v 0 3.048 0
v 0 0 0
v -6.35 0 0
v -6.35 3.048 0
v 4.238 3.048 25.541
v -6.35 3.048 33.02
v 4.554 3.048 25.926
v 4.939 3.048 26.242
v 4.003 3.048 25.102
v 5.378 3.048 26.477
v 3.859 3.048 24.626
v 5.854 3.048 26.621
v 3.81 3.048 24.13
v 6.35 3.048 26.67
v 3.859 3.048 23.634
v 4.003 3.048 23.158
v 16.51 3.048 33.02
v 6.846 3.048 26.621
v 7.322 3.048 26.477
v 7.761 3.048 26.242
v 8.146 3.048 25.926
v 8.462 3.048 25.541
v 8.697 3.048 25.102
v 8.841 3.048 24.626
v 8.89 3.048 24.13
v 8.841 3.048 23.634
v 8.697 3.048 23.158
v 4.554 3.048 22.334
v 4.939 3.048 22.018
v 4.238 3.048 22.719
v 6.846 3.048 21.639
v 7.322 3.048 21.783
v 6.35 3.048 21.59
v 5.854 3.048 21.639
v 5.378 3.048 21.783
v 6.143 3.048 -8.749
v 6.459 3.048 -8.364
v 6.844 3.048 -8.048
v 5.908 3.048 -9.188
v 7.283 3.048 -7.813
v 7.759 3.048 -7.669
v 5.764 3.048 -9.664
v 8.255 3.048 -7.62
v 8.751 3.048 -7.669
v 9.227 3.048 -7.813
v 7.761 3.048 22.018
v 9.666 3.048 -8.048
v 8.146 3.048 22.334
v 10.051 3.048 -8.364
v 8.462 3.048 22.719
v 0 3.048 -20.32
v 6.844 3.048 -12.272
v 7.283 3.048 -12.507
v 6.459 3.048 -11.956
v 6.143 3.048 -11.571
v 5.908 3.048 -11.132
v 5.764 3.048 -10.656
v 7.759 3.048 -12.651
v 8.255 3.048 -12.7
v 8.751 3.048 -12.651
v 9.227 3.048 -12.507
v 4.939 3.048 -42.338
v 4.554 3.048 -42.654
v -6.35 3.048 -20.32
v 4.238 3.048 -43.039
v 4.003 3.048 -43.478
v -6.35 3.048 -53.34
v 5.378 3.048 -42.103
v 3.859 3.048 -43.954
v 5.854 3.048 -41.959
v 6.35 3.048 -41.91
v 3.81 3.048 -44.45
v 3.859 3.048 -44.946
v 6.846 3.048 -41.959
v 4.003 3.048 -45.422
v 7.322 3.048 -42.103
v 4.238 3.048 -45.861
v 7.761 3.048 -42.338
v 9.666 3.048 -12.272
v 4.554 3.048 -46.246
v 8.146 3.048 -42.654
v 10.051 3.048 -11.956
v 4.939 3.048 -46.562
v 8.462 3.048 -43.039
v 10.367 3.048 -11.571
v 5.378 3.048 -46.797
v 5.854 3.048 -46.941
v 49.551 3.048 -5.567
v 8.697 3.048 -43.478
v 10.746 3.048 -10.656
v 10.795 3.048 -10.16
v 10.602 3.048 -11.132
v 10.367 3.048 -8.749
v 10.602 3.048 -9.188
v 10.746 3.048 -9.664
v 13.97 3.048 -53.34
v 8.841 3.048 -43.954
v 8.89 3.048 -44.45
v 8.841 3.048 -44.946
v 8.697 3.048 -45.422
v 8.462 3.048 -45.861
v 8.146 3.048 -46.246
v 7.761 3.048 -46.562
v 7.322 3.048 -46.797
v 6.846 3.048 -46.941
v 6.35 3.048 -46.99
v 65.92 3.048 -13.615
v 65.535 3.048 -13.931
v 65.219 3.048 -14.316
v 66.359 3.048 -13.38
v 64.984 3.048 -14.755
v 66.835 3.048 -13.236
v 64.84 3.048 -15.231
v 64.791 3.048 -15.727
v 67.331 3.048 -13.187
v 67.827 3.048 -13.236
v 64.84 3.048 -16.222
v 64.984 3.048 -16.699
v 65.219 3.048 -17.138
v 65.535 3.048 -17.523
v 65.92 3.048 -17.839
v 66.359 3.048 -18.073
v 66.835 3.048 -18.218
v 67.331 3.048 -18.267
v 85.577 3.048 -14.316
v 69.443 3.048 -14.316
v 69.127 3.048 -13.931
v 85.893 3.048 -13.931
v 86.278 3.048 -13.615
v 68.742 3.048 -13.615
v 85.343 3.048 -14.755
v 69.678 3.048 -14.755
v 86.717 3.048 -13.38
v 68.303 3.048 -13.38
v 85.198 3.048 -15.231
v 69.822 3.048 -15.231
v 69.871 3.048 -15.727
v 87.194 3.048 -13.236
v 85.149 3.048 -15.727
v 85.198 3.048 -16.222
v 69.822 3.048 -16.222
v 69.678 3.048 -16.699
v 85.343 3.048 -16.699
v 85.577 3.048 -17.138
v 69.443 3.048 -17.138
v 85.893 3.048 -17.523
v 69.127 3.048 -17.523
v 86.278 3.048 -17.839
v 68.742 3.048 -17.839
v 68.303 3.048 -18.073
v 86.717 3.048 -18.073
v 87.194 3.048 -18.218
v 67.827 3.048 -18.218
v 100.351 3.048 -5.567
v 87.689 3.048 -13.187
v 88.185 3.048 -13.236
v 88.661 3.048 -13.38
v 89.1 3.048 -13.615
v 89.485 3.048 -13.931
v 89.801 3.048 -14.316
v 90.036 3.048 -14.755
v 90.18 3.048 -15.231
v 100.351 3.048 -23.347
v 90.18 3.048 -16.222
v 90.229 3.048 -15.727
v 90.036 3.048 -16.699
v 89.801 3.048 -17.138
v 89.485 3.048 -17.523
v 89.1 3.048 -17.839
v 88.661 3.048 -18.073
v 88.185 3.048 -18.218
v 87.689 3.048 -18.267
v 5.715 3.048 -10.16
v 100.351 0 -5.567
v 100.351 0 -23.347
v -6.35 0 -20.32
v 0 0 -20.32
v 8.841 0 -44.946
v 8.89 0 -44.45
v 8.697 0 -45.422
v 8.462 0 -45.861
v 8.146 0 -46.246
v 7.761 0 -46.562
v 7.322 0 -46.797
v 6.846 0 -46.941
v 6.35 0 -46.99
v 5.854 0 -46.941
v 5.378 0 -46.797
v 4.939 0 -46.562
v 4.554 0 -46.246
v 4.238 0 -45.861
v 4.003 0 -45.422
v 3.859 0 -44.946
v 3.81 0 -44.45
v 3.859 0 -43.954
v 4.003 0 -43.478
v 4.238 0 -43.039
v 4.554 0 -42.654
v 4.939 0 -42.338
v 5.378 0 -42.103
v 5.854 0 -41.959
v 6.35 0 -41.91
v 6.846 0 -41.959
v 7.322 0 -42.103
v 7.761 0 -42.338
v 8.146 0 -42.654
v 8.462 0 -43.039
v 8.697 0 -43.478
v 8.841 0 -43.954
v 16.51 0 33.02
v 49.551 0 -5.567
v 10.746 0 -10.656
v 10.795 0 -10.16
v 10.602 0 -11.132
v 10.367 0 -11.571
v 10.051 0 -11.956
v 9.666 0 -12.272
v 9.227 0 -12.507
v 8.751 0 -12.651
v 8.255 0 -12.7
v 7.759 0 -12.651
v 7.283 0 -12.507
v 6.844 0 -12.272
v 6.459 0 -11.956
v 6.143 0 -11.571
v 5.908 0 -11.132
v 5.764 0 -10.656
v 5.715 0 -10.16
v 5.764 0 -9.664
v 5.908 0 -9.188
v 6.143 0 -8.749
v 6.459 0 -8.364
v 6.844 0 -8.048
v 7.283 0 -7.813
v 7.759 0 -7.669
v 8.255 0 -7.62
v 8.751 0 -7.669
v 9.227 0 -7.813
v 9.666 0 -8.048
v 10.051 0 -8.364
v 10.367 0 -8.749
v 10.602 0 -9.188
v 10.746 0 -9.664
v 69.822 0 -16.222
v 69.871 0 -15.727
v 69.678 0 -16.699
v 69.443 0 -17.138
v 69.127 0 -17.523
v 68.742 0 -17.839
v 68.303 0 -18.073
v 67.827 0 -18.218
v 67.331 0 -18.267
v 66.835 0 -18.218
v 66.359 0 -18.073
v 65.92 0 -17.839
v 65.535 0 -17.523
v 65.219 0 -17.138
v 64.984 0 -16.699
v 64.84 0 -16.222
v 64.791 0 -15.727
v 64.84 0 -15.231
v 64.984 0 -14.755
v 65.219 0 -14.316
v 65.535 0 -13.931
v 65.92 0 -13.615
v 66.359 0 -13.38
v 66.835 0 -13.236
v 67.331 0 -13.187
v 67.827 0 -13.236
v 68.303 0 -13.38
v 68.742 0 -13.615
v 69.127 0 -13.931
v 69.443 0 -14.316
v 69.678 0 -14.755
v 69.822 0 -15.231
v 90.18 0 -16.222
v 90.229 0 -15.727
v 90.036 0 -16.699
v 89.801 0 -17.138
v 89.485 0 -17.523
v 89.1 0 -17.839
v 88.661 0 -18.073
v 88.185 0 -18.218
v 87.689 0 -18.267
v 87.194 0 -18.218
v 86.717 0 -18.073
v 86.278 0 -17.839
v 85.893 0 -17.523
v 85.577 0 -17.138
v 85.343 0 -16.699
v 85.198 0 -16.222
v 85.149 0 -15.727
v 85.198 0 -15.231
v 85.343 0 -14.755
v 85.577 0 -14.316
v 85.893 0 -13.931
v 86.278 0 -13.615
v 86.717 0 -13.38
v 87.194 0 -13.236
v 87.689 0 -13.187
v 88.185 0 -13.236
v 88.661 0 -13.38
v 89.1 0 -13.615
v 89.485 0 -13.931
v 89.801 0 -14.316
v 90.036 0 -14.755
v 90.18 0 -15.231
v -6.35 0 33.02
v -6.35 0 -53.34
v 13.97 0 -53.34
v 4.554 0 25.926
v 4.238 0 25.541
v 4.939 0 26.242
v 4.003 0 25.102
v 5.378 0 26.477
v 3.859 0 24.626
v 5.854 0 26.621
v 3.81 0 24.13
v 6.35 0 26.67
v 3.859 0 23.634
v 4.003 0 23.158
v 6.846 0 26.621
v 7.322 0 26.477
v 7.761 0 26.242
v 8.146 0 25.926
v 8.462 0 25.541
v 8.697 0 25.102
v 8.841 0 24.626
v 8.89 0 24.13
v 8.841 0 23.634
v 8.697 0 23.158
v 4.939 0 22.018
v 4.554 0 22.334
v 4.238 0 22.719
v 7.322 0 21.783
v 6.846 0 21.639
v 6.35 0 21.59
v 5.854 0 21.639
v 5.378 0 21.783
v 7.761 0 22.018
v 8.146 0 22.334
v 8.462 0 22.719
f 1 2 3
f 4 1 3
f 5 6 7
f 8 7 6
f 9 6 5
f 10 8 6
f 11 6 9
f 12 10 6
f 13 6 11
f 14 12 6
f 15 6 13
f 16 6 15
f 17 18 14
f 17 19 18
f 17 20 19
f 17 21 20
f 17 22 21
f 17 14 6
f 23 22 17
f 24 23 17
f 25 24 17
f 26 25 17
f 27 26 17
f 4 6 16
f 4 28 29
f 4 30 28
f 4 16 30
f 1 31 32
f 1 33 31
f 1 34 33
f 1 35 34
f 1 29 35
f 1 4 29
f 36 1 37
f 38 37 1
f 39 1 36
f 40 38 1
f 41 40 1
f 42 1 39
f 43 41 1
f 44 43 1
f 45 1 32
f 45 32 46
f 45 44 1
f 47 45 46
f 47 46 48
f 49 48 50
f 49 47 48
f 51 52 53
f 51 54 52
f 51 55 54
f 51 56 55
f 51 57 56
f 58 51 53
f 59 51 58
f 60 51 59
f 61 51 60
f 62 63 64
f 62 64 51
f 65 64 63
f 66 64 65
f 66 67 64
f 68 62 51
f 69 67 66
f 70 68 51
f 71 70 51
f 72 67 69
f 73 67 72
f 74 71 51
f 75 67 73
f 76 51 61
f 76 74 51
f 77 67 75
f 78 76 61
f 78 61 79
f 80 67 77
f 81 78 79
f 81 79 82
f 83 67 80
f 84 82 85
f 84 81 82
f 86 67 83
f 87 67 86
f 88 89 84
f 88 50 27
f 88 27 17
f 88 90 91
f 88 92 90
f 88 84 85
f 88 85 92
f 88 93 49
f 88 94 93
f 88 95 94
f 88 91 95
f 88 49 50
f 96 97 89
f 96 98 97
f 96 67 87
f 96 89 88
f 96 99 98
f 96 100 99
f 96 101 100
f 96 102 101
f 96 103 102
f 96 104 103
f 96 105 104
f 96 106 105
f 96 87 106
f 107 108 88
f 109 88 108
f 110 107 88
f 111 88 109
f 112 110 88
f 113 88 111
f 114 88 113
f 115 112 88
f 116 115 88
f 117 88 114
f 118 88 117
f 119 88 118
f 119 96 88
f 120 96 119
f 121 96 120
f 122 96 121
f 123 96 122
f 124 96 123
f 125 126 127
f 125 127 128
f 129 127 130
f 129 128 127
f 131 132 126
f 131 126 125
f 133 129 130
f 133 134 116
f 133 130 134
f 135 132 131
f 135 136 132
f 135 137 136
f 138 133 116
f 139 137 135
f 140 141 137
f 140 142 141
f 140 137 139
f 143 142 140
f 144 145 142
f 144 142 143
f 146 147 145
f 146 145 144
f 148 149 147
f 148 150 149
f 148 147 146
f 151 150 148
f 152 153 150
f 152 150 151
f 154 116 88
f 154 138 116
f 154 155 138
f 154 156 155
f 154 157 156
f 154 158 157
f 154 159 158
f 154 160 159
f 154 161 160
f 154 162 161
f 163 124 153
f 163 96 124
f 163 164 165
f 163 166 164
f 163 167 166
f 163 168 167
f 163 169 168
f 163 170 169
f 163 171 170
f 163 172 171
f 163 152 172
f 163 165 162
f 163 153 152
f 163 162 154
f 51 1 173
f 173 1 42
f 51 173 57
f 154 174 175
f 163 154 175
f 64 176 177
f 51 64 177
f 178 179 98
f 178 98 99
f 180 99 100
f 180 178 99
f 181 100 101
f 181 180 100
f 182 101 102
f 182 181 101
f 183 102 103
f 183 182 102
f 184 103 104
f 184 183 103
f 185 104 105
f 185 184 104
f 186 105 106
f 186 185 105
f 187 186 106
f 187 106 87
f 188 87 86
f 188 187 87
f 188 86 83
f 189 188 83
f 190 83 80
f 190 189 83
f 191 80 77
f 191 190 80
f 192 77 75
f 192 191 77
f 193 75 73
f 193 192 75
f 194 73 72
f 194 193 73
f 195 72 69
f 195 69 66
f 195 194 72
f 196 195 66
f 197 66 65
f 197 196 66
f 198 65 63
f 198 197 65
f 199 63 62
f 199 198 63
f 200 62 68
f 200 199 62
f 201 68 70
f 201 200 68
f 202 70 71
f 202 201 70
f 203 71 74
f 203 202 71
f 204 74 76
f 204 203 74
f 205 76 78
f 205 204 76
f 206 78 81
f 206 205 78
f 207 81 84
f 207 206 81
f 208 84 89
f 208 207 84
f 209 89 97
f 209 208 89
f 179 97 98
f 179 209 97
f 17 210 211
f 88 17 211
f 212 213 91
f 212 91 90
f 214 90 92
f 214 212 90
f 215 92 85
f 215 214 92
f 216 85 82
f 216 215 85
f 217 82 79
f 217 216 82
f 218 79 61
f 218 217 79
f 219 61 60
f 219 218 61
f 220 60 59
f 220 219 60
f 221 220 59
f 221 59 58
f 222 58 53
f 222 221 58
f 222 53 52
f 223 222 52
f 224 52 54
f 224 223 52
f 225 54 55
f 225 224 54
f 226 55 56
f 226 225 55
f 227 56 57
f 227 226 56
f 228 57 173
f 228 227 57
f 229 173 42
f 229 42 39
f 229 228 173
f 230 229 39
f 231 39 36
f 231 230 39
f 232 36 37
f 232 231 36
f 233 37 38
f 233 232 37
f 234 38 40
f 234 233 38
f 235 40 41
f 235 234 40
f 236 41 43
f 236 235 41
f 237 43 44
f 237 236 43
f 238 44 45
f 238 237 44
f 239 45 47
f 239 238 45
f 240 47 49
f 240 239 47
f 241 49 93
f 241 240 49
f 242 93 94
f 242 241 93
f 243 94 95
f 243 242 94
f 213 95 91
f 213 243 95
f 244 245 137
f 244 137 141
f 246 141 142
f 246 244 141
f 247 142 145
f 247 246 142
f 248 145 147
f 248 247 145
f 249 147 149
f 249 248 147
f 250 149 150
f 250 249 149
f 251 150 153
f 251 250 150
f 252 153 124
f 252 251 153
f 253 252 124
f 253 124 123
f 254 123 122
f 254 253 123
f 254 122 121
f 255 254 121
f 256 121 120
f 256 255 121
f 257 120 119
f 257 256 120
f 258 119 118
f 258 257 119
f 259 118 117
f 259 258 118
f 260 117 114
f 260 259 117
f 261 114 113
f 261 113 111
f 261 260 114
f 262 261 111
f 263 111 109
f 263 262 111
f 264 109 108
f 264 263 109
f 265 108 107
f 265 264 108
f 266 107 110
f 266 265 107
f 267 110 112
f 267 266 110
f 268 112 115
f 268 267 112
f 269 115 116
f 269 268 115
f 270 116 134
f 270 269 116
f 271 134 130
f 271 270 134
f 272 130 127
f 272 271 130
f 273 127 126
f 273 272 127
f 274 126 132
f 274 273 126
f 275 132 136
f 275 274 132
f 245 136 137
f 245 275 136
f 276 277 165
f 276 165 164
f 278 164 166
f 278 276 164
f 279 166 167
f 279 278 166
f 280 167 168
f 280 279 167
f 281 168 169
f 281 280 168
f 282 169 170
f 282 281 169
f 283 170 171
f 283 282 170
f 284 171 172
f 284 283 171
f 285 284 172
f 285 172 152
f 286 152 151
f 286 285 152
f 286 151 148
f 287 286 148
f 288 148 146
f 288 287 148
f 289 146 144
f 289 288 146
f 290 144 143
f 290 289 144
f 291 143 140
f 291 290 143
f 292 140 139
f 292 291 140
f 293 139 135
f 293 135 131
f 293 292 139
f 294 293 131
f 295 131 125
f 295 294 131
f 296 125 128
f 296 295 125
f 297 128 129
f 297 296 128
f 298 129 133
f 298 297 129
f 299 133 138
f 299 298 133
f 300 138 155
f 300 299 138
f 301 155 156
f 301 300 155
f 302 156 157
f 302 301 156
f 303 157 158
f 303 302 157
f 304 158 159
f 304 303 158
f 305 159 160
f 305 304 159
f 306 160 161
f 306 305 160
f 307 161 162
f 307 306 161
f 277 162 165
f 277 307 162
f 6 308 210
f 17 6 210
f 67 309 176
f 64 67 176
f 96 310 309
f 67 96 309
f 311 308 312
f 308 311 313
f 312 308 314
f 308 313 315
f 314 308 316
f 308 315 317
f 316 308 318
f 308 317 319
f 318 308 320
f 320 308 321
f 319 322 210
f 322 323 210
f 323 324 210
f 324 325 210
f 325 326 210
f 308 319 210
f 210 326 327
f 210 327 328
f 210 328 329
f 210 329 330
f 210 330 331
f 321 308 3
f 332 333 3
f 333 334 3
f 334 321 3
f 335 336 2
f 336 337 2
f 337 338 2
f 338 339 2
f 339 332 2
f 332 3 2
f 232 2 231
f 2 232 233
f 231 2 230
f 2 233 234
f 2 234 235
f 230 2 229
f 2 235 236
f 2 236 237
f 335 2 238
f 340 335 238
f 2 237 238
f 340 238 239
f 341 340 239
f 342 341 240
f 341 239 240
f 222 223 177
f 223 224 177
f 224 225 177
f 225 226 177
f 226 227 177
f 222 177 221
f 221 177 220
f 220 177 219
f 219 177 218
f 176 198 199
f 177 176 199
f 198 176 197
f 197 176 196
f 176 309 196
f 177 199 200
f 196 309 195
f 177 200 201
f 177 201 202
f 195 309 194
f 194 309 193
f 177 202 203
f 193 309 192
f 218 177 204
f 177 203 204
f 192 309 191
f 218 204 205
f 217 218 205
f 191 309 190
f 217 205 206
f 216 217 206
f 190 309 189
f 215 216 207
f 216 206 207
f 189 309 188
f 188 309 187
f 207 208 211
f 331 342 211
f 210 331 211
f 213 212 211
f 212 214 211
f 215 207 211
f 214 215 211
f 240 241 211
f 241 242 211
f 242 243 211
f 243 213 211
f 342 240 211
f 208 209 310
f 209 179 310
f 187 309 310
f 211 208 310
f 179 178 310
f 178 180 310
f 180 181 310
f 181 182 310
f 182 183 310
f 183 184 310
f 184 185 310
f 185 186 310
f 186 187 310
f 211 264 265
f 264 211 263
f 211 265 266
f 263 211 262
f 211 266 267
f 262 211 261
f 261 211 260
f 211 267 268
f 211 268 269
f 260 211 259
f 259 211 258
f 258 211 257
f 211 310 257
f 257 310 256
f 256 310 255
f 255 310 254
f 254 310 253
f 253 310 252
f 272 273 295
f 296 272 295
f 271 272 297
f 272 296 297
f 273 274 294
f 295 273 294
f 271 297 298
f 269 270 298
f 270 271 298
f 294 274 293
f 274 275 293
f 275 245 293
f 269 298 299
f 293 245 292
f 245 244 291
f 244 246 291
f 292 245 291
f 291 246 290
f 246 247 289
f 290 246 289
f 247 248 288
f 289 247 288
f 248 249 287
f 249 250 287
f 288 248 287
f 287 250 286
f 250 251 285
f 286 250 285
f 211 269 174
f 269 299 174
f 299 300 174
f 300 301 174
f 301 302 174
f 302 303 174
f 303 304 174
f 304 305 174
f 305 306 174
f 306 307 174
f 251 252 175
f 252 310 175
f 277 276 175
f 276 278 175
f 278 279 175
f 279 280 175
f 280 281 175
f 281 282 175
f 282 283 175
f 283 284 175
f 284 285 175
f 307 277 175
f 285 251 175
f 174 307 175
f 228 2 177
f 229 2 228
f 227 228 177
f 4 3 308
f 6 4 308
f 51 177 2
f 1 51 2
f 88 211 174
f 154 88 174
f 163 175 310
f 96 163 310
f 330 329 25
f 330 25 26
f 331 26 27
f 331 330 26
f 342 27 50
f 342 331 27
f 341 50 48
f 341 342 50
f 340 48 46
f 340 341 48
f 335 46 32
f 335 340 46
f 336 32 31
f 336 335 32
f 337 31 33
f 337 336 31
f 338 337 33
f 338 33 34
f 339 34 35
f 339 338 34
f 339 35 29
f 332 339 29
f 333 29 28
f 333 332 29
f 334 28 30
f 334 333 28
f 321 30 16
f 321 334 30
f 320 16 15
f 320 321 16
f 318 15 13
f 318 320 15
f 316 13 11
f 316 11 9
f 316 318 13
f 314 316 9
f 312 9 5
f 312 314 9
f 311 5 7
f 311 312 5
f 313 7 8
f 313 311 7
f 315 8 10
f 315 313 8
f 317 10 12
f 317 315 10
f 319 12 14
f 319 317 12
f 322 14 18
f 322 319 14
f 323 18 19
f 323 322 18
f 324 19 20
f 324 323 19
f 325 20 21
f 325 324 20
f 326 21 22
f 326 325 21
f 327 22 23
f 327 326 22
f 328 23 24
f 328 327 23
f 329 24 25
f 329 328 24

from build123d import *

# Parameters (mm, degrees)
SKETCH1_R           = 2.54
BOSS_EXTRUDE1_DEPTH = 3.048


with BuildPart() as part:
    # Sketch1 → Boss-Extrude1 (new body)
    with BuildSketch(Plane(origin=(0, 0, 0), x_dir=(1, 0, 0), z_dir=(0, 1, 0))):
        Polygon((0, 20.32), (0, 0), (-6.35, 0), (-6.35, -33.02), (16.51, -33.02), (49.550989027, 5.566695169), (100.350989027, 5.566695169), (100.350989027, 23.346695169), (13.97, 53.34), (-6.35, 53.34), (-6.35, 20.32), align=None)
        with Locations((8.255, 10.16)):
            Circle(SKETCH1_R, mode=Mode.SUBTRACT)
        with Locations((87.689183737, 15.726695169)):
            Circle(SKETCH1_R, mode=Mode.SUBTRACT)
        with Locations((6.35, -24.13)):
            Circle(SKETCH1_R, mode=Mode.SUBTRACT)
        with Locations((6.35, 44.45)):
            Circle(SKETCH1_R, mode=Mode.SUBTRACT)
        with Locations((67.330989027, 15.726695169)):
            Circle(SKETCH1_R, mode=Mode.SUBTRACT)
    extrude(amount=BOSS_EXTRUDE1_DEPTH)


solid = part.part
